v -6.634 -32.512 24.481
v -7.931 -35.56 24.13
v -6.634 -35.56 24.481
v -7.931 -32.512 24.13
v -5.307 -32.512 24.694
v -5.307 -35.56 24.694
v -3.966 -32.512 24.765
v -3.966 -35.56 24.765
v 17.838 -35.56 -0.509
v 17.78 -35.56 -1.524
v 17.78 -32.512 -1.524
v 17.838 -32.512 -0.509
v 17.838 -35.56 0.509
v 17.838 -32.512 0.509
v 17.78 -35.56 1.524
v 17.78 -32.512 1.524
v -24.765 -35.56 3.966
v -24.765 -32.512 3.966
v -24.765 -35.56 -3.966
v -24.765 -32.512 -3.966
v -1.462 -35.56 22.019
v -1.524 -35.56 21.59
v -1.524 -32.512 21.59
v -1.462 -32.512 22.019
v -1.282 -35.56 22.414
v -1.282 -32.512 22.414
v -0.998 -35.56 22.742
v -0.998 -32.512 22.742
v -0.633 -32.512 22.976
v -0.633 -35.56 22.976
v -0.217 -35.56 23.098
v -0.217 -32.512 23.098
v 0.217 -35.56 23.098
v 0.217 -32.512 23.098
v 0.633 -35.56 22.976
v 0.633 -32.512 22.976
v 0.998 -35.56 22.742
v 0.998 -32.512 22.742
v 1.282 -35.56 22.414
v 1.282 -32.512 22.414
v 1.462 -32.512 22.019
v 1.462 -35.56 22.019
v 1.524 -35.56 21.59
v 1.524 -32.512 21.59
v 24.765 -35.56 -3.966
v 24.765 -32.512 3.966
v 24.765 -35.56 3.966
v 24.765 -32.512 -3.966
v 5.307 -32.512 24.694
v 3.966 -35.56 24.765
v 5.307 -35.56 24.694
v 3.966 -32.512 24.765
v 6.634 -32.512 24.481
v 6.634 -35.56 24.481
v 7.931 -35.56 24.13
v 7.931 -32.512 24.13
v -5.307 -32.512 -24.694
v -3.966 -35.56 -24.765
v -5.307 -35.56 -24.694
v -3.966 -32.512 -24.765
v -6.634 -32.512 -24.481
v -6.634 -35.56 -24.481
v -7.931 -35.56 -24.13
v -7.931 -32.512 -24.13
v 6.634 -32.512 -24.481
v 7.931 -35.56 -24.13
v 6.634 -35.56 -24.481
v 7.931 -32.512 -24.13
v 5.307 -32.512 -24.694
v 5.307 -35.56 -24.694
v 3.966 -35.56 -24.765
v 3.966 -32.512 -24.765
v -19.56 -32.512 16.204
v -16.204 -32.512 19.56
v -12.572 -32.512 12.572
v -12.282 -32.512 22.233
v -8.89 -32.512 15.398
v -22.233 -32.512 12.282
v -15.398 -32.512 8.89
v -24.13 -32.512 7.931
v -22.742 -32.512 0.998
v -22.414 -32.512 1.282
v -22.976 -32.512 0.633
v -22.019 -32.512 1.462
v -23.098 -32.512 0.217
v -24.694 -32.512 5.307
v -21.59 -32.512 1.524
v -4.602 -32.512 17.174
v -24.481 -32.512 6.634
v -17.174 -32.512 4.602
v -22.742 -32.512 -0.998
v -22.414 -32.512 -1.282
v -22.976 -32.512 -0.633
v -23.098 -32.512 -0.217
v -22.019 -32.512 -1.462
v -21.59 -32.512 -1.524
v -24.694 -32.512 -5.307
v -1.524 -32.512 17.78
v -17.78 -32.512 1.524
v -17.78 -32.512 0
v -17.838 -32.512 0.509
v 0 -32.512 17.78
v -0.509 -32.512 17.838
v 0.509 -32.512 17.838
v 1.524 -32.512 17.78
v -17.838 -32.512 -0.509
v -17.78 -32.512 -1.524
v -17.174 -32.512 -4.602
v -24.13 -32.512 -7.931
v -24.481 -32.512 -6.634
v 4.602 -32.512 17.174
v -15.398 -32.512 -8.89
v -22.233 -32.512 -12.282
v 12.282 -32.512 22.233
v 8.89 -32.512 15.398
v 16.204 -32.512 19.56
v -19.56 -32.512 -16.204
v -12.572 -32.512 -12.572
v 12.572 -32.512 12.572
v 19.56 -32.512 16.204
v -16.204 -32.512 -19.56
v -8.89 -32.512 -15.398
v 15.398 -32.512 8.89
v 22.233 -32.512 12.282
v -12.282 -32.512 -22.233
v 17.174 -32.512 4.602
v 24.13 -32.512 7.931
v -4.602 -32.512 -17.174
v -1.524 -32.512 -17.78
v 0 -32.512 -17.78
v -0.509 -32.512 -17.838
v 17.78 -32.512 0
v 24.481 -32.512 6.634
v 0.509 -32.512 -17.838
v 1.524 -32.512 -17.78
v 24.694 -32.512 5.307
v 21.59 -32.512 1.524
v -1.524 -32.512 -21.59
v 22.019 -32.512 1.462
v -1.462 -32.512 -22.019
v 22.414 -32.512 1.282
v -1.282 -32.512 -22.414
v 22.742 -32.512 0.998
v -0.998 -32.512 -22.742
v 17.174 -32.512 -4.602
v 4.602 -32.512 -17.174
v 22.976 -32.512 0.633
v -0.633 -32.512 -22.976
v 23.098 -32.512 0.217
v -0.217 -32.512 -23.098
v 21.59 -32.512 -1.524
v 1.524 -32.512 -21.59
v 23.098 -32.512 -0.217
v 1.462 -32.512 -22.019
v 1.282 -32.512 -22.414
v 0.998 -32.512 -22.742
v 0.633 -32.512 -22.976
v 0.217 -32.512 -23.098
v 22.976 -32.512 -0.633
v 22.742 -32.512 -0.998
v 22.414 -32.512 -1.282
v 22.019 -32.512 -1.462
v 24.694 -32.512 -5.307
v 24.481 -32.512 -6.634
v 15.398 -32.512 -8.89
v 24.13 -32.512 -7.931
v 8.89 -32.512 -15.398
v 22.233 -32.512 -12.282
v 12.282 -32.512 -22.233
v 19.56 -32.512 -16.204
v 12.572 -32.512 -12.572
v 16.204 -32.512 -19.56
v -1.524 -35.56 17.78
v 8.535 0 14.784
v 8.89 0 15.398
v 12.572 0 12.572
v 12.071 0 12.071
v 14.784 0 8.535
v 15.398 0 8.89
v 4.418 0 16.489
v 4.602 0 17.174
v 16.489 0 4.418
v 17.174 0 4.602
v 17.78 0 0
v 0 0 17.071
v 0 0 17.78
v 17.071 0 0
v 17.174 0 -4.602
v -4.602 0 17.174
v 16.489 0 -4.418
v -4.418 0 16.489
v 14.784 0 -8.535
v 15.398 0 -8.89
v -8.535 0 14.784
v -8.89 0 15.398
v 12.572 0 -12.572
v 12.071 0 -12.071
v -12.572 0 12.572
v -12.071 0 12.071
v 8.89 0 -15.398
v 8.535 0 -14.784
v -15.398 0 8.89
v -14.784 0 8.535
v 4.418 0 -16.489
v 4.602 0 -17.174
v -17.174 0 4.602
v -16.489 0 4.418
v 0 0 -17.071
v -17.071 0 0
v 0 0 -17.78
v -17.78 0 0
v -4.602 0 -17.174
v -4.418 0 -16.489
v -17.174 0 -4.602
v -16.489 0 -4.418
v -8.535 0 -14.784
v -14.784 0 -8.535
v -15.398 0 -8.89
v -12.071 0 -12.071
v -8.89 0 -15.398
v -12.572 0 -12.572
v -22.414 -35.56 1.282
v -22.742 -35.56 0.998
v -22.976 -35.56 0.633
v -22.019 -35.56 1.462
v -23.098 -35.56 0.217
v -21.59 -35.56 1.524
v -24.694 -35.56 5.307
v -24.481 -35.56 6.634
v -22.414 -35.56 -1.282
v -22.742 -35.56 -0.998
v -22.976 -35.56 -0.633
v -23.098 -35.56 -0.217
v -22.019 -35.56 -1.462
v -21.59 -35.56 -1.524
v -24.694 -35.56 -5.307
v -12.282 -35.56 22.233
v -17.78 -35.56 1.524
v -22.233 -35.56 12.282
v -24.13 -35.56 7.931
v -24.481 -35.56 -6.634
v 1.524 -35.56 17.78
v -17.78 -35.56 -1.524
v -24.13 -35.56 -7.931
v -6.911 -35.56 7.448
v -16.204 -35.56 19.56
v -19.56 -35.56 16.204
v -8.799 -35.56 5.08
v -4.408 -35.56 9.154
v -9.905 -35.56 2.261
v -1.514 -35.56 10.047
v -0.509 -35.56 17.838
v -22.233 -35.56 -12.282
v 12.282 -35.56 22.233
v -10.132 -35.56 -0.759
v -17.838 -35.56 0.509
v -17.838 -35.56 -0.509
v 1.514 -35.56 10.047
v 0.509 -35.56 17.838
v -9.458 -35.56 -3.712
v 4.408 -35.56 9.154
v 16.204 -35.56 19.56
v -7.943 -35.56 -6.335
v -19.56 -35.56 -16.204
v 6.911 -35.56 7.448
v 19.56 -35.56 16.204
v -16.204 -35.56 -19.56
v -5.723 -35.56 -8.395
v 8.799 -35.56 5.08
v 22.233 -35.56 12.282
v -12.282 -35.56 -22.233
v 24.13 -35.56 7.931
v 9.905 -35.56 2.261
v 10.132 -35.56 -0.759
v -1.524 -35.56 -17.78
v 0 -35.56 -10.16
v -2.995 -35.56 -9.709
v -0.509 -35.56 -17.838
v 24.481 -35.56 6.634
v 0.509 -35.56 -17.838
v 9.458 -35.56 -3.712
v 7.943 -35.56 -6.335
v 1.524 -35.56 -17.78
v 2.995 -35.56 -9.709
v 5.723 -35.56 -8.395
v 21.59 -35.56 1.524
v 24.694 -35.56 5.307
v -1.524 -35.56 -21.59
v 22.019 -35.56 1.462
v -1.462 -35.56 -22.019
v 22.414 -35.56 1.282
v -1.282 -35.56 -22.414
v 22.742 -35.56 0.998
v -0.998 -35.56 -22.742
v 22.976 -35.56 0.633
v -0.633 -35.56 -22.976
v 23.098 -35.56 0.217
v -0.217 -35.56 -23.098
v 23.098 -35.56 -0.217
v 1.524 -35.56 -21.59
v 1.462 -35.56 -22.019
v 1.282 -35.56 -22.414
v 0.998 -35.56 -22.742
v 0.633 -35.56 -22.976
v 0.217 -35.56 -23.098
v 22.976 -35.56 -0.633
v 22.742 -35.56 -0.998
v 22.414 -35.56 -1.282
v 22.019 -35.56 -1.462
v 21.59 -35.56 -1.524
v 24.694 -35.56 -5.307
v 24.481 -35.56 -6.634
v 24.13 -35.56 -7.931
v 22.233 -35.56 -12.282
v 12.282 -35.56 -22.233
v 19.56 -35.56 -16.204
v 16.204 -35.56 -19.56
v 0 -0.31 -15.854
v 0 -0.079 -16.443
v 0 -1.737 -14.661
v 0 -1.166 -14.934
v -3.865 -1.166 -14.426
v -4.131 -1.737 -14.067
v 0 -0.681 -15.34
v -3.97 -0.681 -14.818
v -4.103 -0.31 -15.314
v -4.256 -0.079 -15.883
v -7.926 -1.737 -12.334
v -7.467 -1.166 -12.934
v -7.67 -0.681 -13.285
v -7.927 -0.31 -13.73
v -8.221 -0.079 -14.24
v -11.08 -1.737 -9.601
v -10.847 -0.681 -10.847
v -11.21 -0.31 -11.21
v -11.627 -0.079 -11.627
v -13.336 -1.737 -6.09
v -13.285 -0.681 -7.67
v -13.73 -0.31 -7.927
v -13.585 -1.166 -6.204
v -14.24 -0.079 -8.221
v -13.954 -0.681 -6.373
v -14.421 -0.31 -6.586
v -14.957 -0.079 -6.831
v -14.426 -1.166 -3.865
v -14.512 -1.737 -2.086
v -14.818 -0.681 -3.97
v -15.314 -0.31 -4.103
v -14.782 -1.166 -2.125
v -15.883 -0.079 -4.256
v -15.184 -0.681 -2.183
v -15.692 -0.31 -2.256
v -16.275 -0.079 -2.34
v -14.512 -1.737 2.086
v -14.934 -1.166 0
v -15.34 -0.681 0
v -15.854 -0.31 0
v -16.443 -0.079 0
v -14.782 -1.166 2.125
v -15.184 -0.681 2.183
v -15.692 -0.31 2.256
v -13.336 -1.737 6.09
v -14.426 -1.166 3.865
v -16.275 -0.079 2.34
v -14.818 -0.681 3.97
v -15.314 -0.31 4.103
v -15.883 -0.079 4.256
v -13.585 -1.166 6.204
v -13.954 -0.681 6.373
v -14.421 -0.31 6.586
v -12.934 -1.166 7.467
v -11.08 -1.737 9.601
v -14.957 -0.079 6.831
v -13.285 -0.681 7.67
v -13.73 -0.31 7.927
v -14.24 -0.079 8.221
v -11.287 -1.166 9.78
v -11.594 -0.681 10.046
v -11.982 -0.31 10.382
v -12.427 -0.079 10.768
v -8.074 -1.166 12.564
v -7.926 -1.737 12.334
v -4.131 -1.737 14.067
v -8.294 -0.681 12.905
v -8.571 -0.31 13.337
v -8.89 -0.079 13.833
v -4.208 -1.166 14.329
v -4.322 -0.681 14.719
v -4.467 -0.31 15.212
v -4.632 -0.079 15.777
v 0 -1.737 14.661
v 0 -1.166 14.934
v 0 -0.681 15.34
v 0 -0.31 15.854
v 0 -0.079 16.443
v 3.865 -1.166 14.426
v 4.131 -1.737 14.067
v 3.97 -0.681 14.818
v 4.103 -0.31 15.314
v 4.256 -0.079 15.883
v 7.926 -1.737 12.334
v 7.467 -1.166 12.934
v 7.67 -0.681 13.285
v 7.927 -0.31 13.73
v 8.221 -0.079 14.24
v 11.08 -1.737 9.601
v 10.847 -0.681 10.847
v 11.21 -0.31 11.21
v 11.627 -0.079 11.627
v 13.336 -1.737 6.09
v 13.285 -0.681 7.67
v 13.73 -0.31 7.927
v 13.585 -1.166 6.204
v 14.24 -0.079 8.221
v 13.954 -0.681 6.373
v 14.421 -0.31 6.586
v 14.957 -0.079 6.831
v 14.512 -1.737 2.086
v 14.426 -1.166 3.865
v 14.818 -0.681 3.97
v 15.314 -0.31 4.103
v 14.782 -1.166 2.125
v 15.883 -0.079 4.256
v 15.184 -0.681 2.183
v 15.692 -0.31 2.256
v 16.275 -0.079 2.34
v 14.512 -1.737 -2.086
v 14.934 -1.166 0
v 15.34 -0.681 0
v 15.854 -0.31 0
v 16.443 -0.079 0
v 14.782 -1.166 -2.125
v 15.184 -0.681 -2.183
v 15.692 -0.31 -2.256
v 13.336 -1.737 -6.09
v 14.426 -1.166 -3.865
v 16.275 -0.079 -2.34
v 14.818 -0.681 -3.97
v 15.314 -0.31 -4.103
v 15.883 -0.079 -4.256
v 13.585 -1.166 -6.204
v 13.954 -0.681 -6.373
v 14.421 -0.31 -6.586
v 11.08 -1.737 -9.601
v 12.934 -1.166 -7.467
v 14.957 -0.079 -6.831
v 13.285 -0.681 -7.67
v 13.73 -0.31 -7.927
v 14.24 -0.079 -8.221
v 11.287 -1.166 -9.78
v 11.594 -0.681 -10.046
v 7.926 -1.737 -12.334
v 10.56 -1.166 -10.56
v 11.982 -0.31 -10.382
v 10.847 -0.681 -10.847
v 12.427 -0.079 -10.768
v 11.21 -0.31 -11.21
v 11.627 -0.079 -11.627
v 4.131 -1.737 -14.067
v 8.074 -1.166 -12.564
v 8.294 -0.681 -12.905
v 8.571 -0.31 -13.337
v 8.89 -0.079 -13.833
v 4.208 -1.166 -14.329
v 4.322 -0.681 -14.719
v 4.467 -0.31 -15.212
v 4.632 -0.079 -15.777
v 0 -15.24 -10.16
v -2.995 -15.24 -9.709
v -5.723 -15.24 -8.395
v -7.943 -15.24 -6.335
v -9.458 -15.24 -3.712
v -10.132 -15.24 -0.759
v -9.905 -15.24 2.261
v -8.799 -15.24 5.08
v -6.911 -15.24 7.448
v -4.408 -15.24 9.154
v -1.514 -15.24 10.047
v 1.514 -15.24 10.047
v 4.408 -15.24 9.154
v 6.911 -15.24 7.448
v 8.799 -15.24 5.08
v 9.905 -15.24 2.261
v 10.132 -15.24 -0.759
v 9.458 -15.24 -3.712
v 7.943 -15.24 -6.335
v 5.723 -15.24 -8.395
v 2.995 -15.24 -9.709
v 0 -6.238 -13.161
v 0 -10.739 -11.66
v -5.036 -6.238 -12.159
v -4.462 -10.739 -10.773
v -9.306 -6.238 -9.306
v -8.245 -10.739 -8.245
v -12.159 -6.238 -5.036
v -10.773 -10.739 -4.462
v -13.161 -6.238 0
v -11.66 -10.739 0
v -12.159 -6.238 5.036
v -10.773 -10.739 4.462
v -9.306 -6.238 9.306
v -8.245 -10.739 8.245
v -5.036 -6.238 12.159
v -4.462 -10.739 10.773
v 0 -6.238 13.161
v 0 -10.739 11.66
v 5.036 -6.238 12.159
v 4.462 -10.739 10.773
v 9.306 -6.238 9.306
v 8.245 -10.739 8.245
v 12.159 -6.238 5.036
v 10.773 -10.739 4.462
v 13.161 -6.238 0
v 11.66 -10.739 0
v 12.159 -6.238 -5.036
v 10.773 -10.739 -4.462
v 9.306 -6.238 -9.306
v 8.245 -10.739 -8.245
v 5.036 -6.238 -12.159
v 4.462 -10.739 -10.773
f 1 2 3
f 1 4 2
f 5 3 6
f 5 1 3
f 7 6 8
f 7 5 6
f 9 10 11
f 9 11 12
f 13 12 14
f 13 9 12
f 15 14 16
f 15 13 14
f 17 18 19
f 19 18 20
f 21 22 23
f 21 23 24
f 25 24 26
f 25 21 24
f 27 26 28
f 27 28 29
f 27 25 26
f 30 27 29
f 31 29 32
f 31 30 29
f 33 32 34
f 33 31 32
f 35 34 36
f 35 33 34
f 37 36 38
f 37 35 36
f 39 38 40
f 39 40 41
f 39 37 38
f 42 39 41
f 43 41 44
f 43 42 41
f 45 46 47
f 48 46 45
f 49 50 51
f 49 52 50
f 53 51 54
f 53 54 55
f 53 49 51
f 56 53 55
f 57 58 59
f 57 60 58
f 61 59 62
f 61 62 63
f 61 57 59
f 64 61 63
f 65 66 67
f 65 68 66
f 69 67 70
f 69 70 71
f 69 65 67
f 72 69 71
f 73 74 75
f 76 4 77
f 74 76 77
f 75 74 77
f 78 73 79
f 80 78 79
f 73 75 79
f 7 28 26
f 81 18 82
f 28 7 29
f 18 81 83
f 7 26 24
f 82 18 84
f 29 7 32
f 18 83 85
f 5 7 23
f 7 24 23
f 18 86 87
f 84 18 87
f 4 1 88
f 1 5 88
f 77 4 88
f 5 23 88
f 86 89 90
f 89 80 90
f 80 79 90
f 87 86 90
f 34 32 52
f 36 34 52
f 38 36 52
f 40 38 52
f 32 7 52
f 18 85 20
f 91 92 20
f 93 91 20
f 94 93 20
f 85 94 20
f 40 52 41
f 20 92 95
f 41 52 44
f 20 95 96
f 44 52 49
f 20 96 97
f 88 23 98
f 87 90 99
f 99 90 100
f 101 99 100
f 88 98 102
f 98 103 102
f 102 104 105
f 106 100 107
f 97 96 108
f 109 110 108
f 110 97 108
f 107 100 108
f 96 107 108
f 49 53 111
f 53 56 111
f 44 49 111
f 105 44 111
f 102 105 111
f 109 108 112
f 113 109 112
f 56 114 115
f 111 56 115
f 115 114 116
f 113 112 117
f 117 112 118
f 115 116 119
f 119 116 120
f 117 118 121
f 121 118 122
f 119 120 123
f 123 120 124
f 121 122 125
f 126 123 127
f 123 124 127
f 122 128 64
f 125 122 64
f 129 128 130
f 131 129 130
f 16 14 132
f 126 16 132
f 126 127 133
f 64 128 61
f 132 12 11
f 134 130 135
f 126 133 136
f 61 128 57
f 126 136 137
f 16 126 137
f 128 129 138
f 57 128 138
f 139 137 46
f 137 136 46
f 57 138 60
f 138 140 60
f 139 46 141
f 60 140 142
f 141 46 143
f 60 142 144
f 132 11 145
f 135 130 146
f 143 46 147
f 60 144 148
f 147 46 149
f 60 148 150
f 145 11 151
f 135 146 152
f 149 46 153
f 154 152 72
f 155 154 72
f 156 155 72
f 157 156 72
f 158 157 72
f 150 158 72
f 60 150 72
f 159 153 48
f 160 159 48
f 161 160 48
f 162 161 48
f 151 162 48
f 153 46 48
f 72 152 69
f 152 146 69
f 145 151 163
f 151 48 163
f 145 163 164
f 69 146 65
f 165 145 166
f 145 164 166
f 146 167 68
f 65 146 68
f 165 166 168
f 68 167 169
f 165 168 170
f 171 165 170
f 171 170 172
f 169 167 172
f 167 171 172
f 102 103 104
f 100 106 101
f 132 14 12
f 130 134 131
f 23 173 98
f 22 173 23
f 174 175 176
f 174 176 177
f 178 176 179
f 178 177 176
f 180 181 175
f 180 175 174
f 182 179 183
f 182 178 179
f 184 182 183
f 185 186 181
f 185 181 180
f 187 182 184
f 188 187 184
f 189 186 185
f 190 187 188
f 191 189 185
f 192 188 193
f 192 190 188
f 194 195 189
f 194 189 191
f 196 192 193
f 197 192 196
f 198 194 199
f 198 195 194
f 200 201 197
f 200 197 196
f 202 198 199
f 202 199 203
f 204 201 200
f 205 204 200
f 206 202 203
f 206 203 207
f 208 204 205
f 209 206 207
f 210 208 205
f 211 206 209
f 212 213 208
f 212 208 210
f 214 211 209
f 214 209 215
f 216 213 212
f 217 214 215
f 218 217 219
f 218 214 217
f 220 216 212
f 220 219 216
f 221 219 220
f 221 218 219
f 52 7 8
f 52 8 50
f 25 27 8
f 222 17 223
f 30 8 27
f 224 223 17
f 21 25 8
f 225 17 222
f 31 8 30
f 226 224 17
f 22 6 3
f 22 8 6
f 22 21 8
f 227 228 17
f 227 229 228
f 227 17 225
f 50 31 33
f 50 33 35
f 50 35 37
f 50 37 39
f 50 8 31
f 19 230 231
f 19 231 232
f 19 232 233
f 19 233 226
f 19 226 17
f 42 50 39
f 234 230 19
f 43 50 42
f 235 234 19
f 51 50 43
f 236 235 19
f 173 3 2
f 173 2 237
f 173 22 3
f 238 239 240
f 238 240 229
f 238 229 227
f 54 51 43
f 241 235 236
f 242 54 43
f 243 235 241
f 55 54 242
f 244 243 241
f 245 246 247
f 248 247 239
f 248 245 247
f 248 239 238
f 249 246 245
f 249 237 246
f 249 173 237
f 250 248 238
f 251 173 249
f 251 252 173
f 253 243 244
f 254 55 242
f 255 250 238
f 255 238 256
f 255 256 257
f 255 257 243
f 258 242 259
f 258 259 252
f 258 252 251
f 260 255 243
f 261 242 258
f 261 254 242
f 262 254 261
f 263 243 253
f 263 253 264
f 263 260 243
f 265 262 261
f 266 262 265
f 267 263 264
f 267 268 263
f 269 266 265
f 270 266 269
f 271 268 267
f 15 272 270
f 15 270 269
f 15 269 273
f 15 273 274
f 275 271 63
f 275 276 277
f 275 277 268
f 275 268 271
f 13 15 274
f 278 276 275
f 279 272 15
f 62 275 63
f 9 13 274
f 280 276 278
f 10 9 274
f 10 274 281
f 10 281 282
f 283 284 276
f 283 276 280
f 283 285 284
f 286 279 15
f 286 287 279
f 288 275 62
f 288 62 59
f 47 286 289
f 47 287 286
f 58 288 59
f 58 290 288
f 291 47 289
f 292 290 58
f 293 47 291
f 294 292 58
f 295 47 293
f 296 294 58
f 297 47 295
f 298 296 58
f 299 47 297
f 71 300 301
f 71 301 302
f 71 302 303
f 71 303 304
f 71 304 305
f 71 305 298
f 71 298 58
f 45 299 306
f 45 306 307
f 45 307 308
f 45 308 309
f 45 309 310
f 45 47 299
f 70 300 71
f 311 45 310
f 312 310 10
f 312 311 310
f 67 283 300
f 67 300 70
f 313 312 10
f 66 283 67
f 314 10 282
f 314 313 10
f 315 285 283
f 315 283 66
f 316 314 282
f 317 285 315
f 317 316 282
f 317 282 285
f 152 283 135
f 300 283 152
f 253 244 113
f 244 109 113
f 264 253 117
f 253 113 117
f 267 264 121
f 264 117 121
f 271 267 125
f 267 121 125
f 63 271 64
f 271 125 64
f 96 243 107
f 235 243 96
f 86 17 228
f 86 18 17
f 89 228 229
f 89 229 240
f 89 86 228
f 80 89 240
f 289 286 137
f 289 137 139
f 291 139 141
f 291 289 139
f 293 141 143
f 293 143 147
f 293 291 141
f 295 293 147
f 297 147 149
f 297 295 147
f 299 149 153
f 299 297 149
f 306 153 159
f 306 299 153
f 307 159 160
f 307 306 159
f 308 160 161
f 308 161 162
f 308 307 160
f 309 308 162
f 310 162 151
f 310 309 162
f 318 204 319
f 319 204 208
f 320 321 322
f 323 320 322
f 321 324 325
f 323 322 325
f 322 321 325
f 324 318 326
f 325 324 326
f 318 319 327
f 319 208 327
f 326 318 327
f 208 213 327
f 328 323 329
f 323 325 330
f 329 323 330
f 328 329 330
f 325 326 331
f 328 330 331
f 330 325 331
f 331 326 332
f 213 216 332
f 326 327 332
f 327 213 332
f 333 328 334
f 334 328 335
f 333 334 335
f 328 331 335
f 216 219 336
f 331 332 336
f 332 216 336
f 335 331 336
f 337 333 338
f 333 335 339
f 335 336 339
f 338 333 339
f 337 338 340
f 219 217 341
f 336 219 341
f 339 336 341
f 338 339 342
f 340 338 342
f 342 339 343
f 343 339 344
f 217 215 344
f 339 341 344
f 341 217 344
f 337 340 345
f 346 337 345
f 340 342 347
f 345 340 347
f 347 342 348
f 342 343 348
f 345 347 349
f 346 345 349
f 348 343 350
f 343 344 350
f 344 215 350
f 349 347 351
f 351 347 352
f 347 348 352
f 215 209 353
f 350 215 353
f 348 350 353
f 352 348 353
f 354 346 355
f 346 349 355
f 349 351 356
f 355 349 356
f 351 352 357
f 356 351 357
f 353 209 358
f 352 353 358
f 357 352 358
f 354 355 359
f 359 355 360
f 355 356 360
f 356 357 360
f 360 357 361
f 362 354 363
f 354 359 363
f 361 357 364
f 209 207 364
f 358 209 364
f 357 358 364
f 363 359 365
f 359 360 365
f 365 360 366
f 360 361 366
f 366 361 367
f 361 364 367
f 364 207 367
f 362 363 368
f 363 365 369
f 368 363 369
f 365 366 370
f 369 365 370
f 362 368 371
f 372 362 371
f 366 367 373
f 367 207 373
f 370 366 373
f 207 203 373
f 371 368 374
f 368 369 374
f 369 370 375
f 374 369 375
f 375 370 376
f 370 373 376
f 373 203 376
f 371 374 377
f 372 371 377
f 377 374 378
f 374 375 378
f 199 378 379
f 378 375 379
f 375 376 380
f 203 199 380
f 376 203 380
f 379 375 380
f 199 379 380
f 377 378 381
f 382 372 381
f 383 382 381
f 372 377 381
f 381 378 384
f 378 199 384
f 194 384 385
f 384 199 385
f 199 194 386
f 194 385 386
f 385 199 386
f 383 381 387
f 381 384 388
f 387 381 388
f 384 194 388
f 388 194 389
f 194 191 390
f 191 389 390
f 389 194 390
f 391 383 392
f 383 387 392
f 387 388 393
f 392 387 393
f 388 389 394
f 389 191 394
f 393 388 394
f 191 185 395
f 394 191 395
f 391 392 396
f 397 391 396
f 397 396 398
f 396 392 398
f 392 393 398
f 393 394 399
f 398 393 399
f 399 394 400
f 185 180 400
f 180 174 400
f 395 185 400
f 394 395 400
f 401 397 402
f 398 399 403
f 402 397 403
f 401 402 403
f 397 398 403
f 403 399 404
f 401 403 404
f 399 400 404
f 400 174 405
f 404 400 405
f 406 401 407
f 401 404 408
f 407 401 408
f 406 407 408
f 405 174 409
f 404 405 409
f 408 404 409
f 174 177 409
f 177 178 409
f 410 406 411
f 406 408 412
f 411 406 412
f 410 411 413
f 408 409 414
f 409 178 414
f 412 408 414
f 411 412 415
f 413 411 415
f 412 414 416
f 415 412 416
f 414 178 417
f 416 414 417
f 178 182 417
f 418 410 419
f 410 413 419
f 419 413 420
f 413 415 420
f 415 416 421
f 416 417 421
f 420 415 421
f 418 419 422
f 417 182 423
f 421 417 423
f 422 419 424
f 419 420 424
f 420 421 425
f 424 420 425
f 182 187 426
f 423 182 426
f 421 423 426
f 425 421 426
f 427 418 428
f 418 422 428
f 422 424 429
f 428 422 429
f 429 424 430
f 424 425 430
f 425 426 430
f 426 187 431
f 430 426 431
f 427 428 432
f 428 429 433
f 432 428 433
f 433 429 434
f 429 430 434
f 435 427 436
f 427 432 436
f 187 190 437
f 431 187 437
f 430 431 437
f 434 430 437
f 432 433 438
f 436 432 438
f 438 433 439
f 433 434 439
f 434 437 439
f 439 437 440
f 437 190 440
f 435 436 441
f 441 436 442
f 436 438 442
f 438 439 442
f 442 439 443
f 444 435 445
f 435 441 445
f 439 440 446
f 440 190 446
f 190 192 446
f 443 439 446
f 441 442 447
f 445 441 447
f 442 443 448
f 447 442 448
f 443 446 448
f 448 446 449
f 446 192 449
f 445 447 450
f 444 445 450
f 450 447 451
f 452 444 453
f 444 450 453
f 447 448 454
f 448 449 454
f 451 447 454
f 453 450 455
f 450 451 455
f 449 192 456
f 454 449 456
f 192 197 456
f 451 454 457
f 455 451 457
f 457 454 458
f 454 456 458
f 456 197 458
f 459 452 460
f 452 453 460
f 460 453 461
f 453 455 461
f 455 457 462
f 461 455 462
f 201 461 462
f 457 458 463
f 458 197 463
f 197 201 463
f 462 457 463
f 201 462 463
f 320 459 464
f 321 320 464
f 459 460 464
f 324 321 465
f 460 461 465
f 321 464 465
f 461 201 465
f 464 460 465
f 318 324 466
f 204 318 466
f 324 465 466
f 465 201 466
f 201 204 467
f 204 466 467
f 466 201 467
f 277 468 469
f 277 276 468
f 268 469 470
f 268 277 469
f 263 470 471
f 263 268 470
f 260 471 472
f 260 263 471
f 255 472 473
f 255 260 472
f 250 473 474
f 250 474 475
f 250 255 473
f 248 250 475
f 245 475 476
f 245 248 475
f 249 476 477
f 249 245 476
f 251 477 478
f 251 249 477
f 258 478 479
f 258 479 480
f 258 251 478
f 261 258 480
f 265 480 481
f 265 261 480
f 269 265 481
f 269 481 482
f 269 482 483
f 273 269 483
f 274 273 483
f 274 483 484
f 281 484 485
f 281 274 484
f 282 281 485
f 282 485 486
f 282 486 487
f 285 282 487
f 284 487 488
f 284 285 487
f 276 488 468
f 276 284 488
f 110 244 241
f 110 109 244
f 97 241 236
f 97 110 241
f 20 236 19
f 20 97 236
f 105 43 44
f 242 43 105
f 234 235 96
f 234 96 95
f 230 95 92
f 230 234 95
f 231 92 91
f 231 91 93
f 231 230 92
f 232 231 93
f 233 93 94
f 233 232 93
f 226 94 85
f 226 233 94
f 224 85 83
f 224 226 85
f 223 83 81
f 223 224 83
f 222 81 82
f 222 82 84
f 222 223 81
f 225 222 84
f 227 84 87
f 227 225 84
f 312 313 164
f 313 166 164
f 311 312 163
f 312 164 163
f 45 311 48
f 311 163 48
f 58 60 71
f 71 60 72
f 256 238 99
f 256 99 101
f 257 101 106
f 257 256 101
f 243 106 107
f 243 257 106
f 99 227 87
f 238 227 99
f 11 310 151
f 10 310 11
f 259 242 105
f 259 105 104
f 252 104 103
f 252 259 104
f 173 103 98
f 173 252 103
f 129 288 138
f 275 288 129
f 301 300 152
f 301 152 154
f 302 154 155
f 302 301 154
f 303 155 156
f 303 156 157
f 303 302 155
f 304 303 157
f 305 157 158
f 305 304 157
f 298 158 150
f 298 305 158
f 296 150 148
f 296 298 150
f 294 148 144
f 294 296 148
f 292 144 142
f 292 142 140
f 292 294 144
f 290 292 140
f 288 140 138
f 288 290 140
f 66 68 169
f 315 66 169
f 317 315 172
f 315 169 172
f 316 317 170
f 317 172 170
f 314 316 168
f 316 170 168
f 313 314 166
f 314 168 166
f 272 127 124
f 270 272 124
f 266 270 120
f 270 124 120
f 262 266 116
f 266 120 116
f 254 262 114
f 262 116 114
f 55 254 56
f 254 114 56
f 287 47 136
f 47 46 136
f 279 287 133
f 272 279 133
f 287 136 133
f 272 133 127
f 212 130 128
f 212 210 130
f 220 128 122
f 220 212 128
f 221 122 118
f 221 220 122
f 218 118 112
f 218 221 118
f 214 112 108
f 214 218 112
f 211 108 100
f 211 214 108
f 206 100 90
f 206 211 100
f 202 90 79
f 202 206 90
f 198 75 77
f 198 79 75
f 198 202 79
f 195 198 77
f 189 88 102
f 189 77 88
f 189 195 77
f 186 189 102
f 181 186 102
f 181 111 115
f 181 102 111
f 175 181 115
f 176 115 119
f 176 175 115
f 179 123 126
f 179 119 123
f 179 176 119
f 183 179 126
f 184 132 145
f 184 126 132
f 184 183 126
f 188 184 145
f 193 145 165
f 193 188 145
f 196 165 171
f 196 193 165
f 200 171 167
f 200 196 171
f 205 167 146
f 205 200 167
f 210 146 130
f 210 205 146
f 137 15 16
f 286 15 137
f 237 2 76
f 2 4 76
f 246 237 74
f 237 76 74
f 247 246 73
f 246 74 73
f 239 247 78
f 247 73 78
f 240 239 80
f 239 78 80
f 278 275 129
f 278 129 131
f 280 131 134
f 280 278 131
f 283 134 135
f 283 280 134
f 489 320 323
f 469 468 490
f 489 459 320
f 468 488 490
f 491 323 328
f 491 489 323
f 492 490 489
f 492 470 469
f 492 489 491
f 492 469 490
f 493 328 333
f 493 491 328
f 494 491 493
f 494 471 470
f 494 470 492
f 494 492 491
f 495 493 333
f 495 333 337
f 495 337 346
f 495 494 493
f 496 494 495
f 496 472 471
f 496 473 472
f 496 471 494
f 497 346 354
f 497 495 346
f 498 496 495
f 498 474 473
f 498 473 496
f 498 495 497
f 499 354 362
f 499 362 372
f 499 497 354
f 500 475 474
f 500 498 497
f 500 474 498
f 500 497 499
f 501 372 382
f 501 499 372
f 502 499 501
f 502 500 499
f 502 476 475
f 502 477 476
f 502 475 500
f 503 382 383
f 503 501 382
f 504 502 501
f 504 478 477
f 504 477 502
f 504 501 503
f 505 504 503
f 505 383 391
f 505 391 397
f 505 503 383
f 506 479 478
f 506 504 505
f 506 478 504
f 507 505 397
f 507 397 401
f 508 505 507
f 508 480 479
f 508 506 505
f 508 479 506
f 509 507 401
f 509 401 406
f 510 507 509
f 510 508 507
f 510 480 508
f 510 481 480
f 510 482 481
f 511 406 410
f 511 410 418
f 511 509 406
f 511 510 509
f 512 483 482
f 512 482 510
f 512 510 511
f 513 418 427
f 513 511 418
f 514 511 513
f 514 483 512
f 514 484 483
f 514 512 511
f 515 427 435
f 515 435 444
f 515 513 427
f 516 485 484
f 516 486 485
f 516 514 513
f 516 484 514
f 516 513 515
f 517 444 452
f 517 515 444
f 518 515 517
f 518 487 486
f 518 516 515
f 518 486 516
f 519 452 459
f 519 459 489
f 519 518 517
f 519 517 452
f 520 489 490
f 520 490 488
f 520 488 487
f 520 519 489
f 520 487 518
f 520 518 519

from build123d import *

# Parameters (mm, degrees)
FILLET1_R           = 2.54
BOSS_EXTRUDE1_START = -3.048
SKETCH2_R           = 25.4
SKETCH2_R_2         = 17.78
BOSS_EXTRUDE1_DEPTH = 3.048
CUT_EXTRUDE1_START  = -3.048
CUT_EXTRUDE1_DEPTH  = 3.048
SKETCH5_OUTSIDE_W   = 68.832
SKETCH5_OUTSIDE_H   = 68.832
SKETCH5_OUTSIDE_W_2 = 49.53
SKETCH5_OUTSIDE_H_2 = 49.53
CUT_EXTRUDE2_DEPTH  = 49.449459687
FILLET2_R           = 12.7


# Read off the part's stored shape, not the designer's step: Cut-Extrude1
with BuildPart() as part:
    # Sketch1 → Revolve1 (revolve)
    with BuildSketch(Plane(origin=(0, 0, 0), x_dir=(0, 0, -1), z_dir=(1, 0, 0)), mode=Mode.PRIVATE) as revolve1_sk:
        Polygon((-15.24, 0), (-10.16, -15.24), (-10.16, -35.56), (-17.78, -35.56), (-17.78, 0), align=None)
    revolve(revolve1_sk.sketch.rotate(Axis((0, -35.56, 0), (0, 1, 0)), 180), axis=Axis((0, -35.56, 0), (0, 1, 0)))

    # Fillet1
    fillet1_edges = [part.edges().sort_by_distance(p)[0] for p in [
        (0, 0, 15.24),
    ]]
    fillet(fillet1_edges, radius=FILLET1_R)

    # Sketch2 → Boss-Extrude1 (add)
    with BuildSketch(Plane.XZ.offset(35.56).offset(BOSS_EXTRUDE1_START)):
        with Locations(Location((0, 0, 0), (0, 0, 270))):
            Circle(SKETCH2_R)
        with Locations(Location((0, 0, 0), (0, 0, 270))):
            Circle(SKETCH2_R_2, mode=Mode.SUBTRACT)
    extrude(amount=BOSS_EXTRUDE1_DEPTH)

    # Cut-Extrude1 outline → Cut-Extrude1 (cut)
    with BuildSketch(Plane(origin=(0, -32.512, 0), x_dir=(1, 0, 0), z_dir=(0, 1, 0)).offset(CUT_EXTRUDE1_START)):
        with BuildLine():
            ThreePointArc((-1.524, 17.78), (0, 17.845194759), (1.524, 17.78))
            Line((1.524, 17.78), (1.524, 21.59))
            ThreePointArc((1.524, 21.59), (0, 23.114), (-1.524, 21.59))
            Line((-1.524, 21.59), (-1.524, 17.78))
        make_face()
        with BuildLine():
            ThreePointArc((-17.78, -1.524), (-17.845194759, 0), (-17.78, 1.524))
            Line((-17.78, 1.524), (-21.59, 1.524))
            ThreePointArc((-21.59, 1.524), (-23.114, 0), (-21.59, -1.524))
            Line((-21.59, -1.524), (-17.78, -1.524))
        make_face()
        with BuildLine():
            ThreePointArc((1.524, -17.78), (0, -17.845194759), (-1.524, -17.78))
            Line((-1.524, -17.78), (-1.524, -21.59))
            ThreePointArc((-1.524, -21.59), (0, -23.114), (1.524, -21.59))
            Line((1.524, -21.59), (1.524, -17.78))
        make_face()
        with BuildLine():
            ThreePointArc((17.78, 1.524), (17.845194759, 0), (17.78, -1.524))
            Line((17.78, -1.524), (21.59, -1.524))
            ThreePointArc((21.59, -1.524), (23.114, 0), (21.59, 1.524))
            Line((21.59, 1.524), (17.78, 1.524))
        make_face()
    extrude(amount=CUT_EXTRUDE1_DEPTH, mode=Mode.SUBTRACT)

    # Sketch5 outside → Cut-Extrude2 (cut, through all)
    with BuildSketch(Plane(origin=(0, -32.512, 0), x_dir=(1, 0, 0), z_dir=(0, 1, 0))):
        Rectangle(SKETCH5_OUTSIDE_W, SKETCH5_OUTSIDE_H)
        Rectangle(SKETCH5_OUTSIDE_W_2, SKETCH5_OUTSIDE_H_2, mode=Mode.SUBTRACT)
    extrude(amount=-CUT_EXTRUDE2_DEPTH, mode=Mode.SUBTRACT)

    # Fillet2
    fillet2_edges = [part.edges().sort_by_distance(p)[0] for p in [
        (24.765, -34.036, 5.644003455),
        (24.765, -34.036, -5.644003455),
        (-5.644003455, -34.036, 24.765),
        (5.644003455, -34.036, 24.765),
        (-24.765, -34.036, -5.644003455),
        (-24.765, -34.036, 5.644003455),
        (5.644003455, -34.036, -24.765),
        (-5.644003455, -34.036, -24.765),
    ]]
    fillet(fillet2_edges, radius=FILLET2_R)


solid = part.part
